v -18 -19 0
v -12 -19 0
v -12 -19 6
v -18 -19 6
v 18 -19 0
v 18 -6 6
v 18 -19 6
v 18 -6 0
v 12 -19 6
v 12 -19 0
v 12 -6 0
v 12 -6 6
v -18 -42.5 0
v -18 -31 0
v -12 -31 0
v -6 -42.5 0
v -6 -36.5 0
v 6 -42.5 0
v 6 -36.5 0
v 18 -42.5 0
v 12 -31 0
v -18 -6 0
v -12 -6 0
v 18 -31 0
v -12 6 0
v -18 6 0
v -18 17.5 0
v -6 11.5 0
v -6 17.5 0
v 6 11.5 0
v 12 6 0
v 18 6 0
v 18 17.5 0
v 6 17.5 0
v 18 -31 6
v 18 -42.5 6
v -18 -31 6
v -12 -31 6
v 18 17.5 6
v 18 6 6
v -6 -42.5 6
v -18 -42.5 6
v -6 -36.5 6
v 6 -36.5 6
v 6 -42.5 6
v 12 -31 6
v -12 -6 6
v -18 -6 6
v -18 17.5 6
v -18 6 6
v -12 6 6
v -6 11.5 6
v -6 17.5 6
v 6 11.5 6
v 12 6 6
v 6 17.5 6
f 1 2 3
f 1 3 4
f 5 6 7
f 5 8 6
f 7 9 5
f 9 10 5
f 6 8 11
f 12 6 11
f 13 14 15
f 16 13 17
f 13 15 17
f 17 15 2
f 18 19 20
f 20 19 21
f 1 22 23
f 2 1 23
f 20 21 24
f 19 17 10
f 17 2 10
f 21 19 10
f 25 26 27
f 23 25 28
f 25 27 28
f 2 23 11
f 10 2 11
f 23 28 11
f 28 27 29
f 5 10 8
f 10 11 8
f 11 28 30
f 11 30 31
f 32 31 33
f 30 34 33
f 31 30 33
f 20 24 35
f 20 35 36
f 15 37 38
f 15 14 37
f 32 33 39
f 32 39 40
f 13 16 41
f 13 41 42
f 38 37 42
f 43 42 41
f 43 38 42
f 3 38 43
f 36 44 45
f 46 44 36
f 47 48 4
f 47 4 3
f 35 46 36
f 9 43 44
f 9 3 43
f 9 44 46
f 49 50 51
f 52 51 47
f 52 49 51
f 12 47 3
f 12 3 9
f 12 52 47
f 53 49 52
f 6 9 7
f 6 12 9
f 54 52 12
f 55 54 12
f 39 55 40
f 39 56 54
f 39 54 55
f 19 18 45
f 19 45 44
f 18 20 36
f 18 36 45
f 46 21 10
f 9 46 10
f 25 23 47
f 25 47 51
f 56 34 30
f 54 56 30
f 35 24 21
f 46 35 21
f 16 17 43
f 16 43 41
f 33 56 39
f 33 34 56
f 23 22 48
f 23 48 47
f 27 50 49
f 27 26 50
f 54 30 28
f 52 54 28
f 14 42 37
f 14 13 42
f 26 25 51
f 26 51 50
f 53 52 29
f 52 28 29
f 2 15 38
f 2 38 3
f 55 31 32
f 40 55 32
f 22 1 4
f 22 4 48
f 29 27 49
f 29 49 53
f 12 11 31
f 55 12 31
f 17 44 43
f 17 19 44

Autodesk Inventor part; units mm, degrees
ref_plane "YZ Plane" through (0, 0, 0) normal (1, 0, 0) x (0, 1, 0)
ref_plane "XZ Plane" through (0, 0, 0) normal (0, 1, 0) x (-1, 0, 0)
ref_plane "XY Plane" through (0, 0, 0) normal (0, 0, 1) x (1, 0, 0)
sketch "Sketch1" plane through (0, 0, 0) normal (0, 0, 1) x (1, 0, 0)
  circle A0 centre (0, 0) radius 8
  circle A1 centre (0, -25) radius 8
  line L0 (0, 0) -> (0, -25) construction
  line L1 (-18, 17.5) -> (18, 17.5)
  line L2 (18, 17.5) -> (18, -42.5)
  line L3 (18, -42.5) -> (-18, -42.5)
  line L4 (-18, -42.5) -> (-18, 17.5)
  line L5 (-18, 17.5) -> (18, -42.5) construction
  line L6 (18, 17.5) -> (-18, -42.5) construction
  line L7 (-6, 17.5) -> (6, 17.5)
  line L8 (6, 17.5) -> (6, 11.5)
  line L9 (6, 11.5) -> (-6, 11.5)
  line L10 (-6, 11.5) -> (-6, 17.5)
  line L11 (-6, -42.5) -> (6, -42.5)
  line L12 (6, -42.5) -> (6, -36.5)
  line L13 (6, -36.5) -> (-6, -36.5)
  line L14 (-6, -36.5) -> (-6, -42.5)
  line L15 (-18, -31) -> (-12, -31)
  line L16 (-12, -31) -> (-12, -19)
  line L17 (-12, -19) -> (-18, -19)
  line L18 (-18, -19) -> (-18, -31)
  line L19 (-18, -6) -> (-12, -6)
  line L20 (-12, -6) -> (-12, 6)
  line L21 (-12, 6) -> (-18, 6)
  line L22 (-18, 6) -> (-18, -6)
  line L23 (18, -6) -> (12, -6)
  line L24 (12, -6) -> (12, 6)
  line L25 (12, 6) -> (18, 6)
  line L26 (18, 6) -> (18, -6)
  line L27 (18, -31) -> (12, -31)
  line L28 (12, -31) -> (12, -19)
  line L29 (12, -19) -> (18, -19)
  line L30 (18, -19) -> (18, -31)
  point P0 (0, -12.5)
  point P1 (0, 11.5)
  point P2 (0, 17.5)
  point P3 (12, 0)
  point P4 (-12, 0)
  point P5 (-12, -25)
  point P6 (12, -25)
  dimension "d0" = 16
  dimension "d1" = 25
  dimension "d2" = 36
  dimension "d3" = 60
  dimension "d4" = 12
  dimension "d5" = 6
extrude "Plate1" add sketch "Sketch1" along normal blind 6 contours A0 | A1 | L1 L10 L9 L8 L2 L25 L24 L23 L29 L28 L27 L3 L12 L13 L14 L4 L15 L16 L17 L19 L20 L21
equation "\"d7\" = Thickness"
equation "\"BendRadius\" = Thickness"
equation "\"BendReliefWidth\" = Thickness"
equation "\"BendReliefDepth\" = 0.5 * Thickness"
equation "\"CornerReliefSize\" = 4 * Thickness"
equation "\"MinimumRemnant\" = 2 * Thickness"
equation "\"TransitionRadius\" = BendRadius"
equation "\"JacobiRadiusSize\" = BendRadius"
equation "\"GapSize\" = Thickness"
equation "\"Thickness\" = 6"
properties part number "achterkant knoppendoosje" material "Wood (Birch)"
